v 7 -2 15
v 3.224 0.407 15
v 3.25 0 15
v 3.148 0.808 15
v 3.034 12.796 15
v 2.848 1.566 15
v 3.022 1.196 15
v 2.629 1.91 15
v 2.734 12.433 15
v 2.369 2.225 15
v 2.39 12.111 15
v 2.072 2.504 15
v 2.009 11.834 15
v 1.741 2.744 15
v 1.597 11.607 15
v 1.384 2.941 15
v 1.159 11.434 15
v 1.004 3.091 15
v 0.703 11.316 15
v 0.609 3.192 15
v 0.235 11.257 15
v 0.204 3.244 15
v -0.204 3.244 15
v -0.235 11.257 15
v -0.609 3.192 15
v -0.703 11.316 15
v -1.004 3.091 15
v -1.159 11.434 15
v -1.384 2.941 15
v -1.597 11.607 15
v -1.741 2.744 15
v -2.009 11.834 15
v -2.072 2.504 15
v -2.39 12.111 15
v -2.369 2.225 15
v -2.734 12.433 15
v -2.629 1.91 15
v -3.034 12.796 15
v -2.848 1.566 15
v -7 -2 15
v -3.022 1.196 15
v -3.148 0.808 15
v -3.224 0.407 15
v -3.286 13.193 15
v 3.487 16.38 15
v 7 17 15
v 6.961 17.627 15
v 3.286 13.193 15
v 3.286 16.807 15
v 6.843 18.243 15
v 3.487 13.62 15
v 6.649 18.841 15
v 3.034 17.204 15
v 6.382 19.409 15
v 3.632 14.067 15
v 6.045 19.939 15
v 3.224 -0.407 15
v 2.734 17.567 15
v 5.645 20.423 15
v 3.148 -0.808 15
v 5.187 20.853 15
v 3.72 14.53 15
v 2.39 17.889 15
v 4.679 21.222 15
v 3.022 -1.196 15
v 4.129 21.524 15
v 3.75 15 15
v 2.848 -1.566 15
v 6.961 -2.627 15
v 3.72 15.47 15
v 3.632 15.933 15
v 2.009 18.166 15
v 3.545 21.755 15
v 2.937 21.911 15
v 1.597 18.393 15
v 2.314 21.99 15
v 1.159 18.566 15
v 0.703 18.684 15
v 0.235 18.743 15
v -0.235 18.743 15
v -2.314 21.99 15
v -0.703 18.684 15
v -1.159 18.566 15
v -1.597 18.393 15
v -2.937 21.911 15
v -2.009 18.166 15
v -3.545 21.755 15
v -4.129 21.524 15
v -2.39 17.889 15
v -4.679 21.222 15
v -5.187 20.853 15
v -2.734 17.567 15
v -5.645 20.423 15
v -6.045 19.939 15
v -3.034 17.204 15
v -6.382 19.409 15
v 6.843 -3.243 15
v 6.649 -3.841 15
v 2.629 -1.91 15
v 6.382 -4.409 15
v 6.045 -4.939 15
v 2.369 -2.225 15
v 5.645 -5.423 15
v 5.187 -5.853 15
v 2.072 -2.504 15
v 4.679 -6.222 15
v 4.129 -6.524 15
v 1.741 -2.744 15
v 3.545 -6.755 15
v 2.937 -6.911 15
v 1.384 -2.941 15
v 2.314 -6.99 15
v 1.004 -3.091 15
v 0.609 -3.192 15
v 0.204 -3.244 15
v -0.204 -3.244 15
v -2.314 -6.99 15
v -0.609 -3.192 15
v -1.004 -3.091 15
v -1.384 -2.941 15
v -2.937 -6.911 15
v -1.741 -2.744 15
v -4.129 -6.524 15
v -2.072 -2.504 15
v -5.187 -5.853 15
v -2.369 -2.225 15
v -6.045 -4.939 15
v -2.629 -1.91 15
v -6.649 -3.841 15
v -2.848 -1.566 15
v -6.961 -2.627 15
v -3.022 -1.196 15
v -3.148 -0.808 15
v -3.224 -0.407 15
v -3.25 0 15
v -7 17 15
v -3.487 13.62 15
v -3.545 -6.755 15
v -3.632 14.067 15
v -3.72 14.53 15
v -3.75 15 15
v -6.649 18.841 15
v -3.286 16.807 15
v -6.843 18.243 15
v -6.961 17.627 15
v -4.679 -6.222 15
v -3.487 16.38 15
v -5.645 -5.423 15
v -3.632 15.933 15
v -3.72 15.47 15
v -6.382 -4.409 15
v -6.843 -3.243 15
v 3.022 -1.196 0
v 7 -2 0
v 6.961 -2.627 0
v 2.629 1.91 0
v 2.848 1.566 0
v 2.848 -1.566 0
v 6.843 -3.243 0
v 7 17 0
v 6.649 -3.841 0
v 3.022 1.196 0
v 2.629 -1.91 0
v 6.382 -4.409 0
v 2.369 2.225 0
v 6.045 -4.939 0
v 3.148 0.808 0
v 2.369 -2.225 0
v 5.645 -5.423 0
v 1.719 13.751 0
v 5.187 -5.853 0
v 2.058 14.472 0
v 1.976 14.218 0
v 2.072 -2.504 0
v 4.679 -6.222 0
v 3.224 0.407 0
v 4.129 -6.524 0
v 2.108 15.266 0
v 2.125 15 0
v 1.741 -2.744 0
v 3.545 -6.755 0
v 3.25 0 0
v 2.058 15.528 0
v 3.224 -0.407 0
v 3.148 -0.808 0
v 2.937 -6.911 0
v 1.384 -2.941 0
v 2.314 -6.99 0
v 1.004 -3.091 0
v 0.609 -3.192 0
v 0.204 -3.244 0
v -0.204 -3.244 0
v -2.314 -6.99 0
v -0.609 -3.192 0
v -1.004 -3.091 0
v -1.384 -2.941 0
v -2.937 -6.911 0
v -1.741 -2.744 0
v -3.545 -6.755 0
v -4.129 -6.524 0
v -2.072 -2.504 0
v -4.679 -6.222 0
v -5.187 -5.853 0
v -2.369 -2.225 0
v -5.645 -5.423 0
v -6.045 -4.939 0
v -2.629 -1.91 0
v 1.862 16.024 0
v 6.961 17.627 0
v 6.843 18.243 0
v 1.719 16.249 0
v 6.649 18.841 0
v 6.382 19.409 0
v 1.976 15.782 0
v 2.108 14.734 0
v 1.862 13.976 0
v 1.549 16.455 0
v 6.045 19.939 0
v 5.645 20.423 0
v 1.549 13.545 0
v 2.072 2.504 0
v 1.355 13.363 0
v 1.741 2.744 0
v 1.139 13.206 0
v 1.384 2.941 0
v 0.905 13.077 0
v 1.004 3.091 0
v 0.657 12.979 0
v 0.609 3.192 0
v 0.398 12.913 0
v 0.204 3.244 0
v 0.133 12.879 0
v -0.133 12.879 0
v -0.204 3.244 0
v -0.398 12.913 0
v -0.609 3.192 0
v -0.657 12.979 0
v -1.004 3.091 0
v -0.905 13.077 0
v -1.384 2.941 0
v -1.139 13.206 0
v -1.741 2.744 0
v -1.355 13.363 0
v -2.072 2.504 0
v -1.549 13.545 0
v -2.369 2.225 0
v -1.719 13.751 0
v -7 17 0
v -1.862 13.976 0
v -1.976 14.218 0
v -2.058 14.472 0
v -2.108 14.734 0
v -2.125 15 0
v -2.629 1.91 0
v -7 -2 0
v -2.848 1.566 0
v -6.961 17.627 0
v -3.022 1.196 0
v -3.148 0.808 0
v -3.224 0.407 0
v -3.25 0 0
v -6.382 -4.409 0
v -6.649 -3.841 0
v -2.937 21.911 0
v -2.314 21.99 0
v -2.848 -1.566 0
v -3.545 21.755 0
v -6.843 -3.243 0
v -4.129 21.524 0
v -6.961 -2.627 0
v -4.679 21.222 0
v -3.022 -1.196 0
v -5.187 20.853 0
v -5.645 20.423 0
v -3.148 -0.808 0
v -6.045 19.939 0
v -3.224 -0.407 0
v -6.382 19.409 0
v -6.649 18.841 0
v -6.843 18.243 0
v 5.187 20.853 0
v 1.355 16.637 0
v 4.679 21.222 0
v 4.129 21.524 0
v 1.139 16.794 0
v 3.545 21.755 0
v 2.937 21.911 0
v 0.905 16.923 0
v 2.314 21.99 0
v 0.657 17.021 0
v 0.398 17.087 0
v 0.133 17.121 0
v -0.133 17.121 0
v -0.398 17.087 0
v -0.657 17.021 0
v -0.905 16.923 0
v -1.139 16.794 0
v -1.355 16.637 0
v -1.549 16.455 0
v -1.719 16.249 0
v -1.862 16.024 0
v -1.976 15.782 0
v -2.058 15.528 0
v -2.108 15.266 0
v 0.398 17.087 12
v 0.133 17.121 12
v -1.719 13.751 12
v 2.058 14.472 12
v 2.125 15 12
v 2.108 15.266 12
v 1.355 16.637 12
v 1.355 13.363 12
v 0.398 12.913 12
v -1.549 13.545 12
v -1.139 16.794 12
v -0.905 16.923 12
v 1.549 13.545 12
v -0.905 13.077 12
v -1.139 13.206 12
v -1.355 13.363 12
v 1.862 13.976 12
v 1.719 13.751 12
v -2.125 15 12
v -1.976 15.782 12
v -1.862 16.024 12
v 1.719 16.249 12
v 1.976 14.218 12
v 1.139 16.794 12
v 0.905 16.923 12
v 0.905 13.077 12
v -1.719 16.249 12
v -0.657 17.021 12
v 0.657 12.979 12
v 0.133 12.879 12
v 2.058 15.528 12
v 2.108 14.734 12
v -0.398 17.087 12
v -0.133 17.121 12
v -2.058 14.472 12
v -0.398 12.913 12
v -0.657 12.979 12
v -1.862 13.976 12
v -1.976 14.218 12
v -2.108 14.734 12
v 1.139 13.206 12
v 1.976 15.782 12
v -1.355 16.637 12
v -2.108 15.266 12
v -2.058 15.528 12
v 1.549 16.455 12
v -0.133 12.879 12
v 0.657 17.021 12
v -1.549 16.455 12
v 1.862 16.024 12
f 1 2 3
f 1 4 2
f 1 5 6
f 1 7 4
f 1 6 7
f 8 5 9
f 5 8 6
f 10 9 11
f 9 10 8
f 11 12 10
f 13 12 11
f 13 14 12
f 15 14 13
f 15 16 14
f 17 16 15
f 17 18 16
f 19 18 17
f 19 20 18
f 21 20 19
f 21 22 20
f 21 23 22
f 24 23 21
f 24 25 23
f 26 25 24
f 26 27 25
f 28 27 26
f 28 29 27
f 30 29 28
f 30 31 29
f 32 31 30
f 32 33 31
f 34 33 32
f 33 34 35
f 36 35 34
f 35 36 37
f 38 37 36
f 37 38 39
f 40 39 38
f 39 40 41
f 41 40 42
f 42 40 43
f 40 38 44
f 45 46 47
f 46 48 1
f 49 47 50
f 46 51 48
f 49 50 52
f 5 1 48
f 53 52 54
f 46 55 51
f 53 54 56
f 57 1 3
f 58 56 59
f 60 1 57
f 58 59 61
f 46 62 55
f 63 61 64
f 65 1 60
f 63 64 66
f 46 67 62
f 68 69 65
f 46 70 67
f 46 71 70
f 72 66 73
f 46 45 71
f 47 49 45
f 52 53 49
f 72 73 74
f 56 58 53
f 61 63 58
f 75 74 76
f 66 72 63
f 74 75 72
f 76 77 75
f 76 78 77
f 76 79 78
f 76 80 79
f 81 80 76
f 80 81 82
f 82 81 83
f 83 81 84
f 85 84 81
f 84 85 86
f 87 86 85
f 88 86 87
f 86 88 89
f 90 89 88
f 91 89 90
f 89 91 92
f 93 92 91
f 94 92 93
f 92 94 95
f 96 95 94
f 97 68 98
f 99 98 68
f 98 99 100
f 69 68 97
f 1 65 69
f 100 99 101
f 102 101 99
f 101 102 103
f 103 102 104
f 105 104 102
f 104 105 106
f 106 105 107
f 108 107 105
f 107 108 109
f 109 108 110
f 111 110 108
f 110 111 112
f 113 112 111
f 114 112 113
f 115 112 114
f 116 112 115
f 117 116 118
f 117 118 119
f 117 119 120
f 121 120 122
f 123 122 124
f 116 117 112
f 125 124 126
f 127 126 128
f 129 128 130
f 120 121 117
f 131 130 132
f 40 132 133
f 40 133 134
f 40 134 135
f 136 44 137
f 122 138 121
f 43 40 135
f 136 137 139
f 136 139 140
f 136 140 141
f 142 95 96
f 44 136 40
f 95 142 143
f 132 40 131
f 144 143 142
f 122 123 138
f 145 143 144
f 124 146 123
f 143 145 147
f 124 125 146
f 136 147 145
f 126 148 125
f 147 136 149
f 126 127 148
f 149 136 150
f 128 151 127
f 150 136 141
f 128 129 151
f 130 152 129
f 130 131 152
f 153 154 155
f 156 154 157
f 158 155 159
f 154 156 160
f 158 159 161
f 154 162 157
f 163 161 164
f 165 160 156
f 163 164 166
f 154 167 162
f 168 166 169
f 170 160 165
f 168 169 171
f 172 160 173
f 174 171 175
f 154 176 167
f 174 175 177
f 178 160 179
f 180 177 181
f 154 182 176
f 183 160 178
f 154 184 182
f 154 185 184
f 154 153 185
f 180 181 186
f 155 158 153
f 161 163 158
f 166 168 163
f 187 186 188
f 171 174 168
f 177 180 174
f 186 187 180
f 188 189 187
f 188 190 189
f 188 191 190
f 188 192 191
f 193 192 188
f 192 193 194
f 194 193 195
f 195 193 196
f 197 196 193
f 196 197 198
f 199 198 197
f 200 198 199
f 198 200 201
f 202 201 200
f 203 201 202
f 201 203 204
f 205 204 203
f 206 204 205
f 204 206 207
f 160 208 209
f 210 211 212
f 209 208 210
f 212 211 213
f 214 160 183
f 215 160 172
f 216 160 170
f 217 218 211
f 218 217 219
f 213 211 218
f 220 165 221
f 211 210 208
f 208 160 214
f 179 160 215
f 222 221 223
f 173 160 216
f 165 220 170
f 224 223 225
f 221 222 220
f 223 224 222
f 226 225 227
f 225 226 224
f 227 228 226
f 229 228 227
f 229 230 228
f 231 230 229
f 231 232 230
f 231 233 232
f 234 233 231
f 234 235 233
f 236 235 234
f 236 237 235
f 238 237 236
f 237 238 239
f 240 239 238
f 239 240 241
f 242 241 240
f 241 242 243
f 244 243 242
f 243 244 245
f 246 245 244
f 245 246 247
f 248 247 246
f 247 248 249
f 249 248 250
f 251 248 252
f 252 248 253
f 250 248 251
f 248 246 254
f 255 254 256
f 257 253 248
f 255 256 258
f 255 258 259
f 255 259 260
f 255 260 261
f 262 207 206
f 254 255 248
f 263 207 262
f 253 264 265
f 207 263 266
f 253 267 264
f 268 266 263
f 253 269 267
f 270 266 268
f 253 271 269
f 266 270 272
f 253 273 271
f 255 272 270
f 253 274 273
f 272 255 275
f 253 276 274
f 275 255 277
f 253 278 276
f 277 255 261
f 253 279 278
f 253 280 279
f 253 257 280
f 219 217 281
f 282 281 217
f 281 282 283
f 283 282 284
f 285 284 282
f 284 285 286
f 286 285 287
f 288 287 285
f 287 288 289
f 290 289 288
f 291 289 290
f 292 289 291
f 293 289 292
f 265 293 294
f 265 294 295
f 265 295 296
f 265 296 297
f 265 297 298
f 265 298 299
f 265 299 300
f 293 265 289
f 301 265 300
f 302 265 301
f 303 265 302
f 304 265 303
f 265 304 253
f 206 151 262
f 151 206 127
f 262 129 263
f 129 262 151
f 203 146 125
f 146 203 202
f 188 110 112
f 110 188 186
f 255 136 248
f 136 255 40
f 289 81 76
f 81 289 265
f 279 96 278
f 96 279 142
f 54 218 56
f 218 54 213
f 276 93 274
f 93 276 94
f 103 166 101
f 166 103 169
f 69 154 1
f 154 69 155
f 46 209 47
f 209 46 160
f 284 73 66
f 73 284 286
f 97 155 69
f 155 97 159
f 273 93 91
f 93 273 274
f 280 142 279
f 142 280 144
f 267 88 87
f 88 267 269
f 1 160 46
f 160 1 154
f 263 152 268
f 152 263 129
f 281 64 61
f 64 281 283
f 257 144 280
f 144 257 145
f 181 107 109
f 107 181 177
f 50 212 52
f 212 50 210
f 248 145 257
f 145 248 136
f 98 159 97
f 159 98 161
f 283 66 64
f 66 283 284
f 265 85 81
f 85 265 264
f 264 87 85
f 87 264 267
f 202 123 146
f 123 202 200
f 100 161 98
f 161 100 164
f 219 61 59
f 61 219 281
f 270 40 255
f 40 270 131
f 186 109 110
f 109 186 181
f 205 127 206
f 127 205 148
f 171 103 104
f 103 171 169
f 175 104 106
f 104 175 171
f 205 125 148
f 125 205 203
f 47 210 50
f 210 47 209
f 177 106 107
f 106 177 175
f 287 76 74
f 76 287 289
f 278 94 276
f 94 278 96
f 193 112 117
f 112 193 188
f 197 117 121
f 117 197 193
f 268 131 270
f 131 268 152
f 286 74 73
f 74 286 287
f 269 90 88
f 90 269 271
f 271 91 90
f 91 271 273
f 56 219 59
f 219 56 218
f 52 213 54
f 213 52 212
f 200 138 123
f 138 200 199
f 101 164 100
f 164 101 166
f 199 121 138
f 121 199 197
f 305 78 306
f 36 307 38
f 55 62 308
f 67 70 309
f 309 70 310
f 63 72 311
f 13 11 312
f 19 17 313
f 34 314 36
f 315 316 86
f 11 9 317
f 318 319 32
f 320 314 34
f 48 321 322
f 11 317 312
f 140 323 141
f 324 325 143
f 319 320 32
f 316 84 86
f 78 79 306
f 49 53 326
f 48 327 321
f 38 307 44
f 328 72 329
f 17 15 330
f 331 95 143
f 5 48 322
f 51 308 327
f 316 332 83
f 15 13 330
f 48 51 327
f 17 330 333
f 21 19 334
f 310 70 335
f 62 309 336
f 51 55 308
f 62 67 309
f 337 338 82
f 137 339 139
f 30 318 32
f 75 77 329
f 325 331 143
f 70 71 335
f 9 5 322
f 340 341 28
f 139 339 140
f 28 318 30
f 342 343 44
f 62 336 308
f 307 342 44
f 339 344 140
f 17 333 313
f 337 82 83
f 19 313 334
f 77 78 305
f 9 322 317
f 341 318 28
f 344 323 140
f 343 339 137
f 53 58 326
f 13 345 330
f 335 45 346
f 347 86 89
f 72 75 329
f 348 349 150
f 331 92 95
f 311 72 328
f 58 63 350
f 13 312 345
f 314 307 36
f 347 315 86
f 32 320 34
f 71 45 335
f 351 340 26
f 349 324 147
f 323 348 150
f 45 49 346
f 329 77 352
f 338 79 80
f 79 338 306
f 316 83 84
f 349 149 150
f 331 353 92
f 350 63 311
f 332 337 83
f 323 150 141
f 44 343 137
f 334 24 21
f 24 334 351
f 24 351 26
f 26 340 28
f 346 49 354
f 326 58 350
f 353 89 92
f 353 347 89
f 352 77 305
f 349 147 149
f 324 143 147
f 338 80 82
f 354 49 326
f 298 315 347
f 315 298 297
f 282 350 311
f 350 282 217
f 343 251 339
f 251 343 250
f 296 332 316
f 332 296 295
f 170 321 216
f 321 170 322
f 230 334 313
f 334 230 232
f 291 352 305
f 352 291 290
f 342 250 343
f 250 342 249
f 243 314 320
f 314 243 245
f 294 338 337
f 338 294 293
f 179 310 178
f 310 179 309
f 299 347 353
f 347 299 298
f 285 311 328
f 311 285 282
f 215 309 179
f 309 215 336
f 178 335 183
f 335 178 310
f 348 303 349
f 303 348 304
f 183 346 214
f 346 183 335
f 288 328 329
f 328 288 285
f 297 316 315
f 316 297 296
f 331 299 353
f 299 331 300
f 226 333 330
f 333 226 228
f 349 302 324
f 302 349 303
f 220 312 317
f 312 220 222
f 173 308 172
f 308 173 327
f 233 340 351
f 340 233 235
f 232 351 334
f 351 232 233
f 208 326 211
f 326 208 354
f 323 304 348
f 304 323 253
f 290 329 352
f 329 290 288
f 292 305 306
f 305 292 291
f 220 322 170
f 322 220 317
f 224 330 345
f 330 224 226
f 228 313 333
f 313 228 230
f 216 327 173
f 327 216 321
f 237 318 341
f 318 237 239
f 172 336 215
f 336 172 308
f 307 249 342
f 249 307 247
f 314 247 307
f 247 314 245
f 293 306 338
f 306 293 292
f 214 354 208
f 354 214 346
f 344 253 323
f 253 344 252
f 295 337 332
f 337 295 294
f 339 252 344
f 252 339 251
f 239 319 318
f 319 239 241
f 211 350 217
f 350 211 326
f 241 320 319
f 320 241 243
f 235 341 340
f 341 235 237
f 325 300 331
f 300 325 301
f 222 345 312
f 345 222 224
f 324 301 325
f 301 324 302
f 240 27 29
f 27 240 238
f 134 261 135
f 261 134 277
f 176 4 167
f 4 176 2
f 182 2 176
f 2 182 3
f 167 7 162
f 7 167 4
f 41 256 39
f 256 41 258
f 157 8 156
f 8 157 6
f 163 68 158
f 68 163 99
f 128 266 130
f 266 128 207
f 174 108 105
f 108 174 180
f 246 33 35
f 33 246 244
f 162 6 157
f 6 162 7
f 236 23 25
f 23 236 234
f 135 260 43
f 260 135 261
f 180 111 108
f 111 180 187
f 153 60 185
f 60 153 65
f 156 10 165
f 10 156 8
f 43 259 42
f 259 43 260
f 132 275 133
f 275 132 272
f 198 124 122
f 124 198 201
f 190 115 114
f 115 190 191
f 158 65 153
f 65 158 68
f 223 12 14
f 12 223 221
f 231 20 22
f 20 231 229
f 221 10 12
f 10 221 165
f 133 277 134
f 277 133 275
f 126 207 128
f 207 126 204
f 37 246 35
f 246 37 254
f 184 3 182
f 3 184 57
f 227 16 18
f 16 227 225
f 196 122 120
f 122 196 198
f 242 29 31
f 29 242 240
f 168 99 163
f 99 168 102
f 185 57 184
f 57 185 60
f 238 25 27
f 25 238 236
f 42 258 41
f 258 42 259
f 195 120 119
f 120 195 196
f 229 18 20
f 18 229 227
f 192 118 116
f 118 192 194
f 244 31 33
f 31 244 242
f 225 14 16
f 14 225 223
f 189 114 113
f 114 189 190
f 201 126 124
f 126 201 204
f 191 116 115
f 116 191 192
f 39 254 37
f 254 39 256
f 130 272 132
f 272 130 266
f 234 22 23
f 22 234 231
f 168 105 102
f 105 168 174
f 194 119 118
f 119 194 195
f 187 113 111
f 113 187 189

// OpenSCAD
$fn = 50;


difference() {
	union() {
		cylinder(h = 15, r = 7.0000000000);
		translate(v = [0.0000000000, 7.5000000000, 0]) {
			hull() {
				translate(v = [-2.0000000000, 9.5000000000, 0]) {
					cylinder(h = 15, r = 5);
				}
				translate(v = [2.0000000000, 9.5000000000, 0]) {
					cylinder(h = 15, r = 5);
				}
				translate(v = [-2.0000000000, -9.5000000000, 0]) {
					cylinder(h = 15, r = 5);
				}
				translate(v = [2.0000000000, -9.5000000000, 0]) {
					cylinder(h = 15, r = 5);
				}
			}
		}
		translate(v = [0.0000000000, 7.5000000000, 0]) {
			hull() {
				translate(v = [-2.0000000000, 9.5000000000, 0]) {
					cylinder(h = 15, r = 5);
				}
				translate(v = [2.0000000000, 9.5000000000, 0]) {
					cylinder(h = 15, r = 5);
				}
				translate(v = [-2.0000000000, -9.5000000000, 0]) {
					cylinder(h = 15, r = 5);
				}
				translate(v = [2.0000000000, -9.5000000000, 0]) {
					cylinder(h = 15, r = 5);
				}
			}
		}
	}
	union() {
		translate(v = [0.0000000000, 15.0000000000, 15]) {
			rotate(a = [0, 0, 0]) {
				difference() {
					union() {
						#translate(v = [0, 0, -15.0000000000]) {
							cylinder(h = 15, r = 2.0000000000);
						}
						#translate(v = [0, 0, -3]) {
							cylinder(h = 3, r1 = 2.1250000000, r2 = 3.7500000000);
						}
						#translate(v = [0, 0, -15.0000000000]) {
							cylinder(h = 15, r = 2.1250000000);
						}
						#translate(v = [0, 0, -15.0000000000]) {
							cylinder(h = 15, r = 2.0000000000);
						}
					}
					union();
				}
			}
		}
		translate(v = [0.0000000000, 15.0000000000, 15]) {
			rotate(a = [0, 0, 0]) {
				difference() {
					union() {
						#translate(v = [0, 0, -15.0000000000]) {
							cylinder(h = 15, r = 2.0000000000);
						}
						#translate(v = [0, 0, -3]) {
							cylinder(h = 3, r1 = 2.1250000000, r2 = 3.7500000000);
						}
						#translate(v = [0, 0, -15.0000000000]) {
							cylinder(h = 15, r = 2.1250000000);
						}
						#translate(v = [0, 0, -15.0000000000]) {
							cylinder(h = 15, r = 2.0000000000);
						}
					}
					union();
				}
			}
		}
		translate(v = [0, 0, -100]) {
			cylinder(h = 200, r = 3.2500000000);
		}
		translate(v = [0, 0, -100]) {
			cylinder(h = 200, r = 1.8000000000);
		}
	}
}
